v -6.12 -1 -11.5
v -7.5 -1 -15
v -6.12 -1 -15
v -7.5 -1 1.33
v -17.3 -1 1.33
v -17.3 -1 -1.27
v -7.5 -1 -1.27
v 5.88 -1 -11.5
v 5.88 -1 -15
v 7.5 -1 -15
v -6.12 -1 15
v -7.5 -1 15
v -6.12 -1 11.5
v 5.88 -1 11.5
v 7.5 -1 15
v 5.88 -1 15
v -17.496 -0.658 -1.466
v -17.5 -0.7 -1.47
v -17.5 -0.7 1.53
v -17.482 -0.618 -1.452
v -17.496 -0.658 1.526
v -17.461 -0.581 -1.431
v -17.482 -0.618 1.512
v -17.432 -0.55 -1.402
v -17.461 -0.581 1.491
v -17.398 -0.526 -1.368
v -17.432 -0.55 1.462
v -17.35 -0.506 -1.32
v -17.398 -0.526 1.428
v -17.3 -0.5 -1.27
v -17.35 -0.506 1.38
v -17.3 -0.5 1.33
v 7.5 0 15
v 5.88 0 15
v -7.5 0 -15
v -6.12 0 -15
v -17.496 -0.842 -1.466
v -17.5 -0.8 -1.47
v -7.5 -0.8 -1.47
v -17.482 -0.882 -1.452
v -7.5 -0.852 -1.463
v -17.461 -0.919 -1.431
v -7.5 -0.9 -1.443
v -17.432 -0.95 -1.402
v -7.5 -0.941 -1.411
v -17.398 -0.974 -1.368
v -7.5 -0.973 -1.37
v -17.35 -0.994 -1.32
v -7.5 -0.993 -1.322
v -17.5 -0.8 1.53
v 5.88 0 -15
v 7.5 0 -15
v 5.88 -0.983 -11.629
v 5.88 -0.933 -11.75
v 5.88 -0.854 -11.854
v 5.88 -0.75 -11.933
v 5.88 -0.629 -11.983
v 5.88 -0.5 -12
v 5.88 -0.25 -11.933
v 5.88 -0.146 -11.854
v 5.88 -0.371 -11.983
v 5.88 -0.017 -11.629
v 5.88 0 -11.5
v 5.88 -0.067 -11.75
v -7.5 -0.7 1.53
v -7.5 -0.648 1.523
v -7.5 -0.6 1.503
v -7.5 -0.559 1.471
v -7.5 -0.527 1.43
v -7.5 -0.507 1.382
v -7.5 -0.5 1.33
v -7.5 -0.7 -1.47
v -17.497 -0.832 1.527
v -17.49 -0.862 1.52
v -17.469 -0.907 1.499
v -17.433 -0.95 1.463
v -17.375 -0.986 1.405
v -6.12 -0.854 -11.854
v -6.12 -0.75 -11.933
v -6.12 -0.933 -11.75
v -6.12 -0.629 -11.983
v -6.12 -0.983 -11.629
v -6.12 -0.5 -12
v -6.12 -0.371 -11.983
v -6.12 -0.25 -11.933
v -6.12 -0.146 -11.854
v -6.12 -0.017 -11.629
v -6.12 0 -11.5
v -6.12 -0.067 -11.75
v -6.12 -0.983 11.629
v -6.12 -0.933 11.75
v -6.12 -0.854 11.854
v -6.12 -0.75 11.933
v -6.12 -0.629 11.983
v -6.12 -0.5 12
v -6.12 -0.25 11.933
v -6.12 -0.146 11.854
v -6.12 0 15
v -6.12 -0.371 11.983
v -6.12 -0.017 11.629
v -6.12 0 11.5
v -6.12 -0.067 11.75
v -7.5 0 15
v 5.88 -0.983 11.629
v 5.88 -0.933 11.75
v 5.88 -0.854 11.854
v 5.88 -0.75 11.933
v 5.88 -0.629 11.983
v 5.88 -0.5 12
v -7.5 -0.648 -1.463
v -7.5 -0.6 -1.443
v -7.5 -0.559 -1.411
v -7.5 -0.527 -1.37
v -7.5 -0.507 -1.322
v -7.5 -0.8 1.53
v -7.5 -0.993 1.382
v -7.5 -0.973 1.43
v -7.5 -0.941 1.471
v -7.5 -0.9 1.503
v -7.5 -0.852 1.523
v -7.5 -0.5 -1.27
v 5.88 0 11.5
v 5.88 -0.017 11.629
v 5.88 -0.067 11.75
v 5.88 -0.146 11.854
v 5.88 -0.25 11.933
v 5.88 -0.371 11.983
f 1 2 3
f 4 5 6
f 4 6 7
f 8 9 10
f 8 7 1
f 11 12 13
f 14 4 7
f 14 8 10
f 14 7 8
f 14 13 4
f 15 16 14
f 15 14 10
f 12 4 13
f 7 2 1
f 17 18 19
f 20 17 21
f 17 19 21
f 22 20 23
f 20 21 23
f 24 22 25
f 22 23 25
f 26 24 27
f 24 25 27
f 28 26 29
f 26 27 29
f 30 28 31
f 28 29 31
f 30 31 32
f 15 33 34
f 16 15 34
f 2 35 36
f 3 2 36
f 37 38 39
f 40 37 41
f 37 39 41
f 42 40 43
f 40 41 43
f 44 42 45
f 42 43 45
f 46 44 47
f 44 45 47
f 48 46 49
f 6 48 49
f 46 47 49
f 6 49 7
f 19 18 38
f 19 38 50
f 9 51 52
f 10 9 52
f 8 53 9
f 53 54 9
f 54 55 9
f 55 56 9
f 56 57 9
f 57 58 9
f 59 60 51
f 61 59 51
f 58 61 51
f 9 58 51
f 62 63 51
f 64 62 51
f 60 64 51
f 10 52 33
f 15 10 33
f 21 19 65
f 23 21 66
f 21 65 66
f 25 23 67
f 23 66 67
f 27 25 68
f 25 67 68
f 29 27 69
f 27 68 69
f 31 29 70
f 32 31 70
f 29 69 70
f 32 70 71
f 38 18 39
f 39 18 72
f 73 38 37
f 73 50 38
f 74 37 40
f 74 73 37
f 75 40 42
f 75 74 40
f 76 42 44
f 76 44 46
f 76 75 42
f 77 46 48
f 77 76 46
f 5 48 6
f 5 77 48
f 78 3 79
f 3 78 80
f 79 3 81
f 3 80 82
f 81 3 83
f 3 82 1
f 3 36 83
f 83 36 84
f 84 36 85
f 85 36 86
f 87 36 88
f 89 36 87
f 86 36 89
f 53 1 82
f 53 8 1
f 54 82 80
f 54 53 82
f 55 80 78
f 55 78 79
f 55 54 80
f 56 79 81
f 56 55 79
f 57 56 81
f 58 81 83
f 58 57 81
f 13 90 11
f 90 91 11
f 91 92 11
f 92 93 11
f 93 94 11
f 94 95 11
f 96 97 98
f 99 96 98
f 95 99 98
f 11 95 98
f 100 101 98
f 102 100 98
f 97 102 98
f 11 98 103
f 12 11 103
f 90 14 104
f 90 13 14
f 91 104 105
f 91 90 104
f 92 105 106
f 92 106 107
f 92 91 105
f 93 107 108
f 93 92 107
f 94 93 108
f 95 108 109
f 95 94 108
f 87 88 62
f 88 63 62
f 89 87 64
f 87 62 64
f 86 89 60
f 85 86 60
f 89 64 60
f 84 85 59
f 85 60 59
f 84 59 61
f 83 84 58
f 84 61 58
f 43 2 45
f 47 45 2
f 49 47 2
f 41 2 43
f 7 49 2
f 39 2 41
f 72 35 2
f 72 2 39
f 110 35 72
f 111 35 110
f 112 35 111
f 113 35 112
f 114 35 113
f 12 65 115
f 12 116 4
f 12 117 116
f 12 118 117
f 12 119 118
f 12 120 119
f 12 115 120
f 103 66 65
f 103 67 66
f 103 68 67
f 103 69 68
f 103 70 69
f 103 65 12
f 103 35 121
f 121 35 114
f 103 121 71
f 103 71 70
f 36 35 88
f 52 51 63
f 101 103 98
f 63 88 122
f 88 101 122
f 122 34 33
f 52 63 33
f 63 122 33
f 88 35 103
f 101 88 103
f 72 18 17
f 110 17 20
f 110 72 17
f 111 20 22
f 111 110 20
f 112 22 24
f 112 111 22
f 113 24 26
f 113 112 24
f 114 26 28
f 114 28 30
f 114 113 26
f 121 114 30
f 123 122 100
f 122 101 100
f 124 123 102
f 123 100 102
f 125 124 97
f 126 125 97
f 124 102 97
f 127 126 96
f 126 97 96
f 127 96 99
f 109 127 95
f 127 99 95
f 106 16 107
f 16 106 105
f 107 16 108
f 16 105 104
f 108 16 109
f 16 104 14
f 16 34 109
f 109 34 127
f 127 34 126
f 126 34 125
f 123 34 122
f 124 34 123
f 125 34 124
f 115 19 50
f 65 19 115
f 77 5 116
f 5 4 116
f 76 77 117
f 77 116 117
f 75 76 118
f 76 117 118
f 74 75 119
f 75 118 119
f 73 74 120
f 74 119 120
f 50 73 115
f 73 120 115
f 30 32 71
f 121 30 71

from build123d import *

# Parameters (mm, degrees)
F0_W     = 10
F0_H     = 3
F1_DEPTH = 1
F2_DEPTH = 0.5
F3_R     = 0.2
F4_R     = 0.49999


# Not quite as in the source:
# - a fillet or chamfer is up to 0.001 mm smaller than in the source, because OpenCascade refuses the exact size


with BuildPart() as f1:
    # F0 (on Front) → F1 (new body)
    with BuildSketch(Plane.XZ):
        with Locations((-12.5, 0.0299999826)):
            Rectangle(F0_W, F0_H)
        Polygon((-6.1200000346, 15), (-7.5, 15), (-7.5, 1.5299999826), (-7.5, -1.4700000174), (-7.5, -15), (-6.1200000346, -15), (-6.1200000346, -12), (5.8799999654, -12), (5.8799999654, -15), (7.5, -15), (7.5, 15), (5.8799999654, 15), (5.8799999654, 12), (-6.1200000346, 12), align=None)
    extrude(amount=F1_DEPTH)

    # F0 (on Front) → F2 (cut)
    with BuildSketch(Plane.XZ):
        with Locations((-12.5, 0.0299999826)):
            Rectangle(F0_W, F0_H)
    extrude(amount=F2_DEPTH, mode=Mode.SUBTRACT)

    # F3
    f3_edges = [f1.edges().sort_by_distance(p)[0] for p in [
        (-12.5, -0.5, -1.47),
        (-12.5, -0.5, 1.53),
        (-12.5, -1, -1.47),
        (-12.5, -1, 1.53),
        (-17.5, -1, 0.03),
        (-17.5, -0.5, 0.03),
    ]]
    fillet(f3_edges, radius=F3_R)

    # F4 (radius 0.5 in the source; OpenCascade refuses exactly that, so slightly less here)
    f4_edges = [f1.edges().sort_by_distance(p)[0] for p in [
        (-0.12, -1, -12),
        (-0.12, -1, 12),
        (-0.12, 0, -12),
        (-0.12, 0, 12),
    ]]
    fillet(f4_edges, radius=F4_R)


solid = f1.part
